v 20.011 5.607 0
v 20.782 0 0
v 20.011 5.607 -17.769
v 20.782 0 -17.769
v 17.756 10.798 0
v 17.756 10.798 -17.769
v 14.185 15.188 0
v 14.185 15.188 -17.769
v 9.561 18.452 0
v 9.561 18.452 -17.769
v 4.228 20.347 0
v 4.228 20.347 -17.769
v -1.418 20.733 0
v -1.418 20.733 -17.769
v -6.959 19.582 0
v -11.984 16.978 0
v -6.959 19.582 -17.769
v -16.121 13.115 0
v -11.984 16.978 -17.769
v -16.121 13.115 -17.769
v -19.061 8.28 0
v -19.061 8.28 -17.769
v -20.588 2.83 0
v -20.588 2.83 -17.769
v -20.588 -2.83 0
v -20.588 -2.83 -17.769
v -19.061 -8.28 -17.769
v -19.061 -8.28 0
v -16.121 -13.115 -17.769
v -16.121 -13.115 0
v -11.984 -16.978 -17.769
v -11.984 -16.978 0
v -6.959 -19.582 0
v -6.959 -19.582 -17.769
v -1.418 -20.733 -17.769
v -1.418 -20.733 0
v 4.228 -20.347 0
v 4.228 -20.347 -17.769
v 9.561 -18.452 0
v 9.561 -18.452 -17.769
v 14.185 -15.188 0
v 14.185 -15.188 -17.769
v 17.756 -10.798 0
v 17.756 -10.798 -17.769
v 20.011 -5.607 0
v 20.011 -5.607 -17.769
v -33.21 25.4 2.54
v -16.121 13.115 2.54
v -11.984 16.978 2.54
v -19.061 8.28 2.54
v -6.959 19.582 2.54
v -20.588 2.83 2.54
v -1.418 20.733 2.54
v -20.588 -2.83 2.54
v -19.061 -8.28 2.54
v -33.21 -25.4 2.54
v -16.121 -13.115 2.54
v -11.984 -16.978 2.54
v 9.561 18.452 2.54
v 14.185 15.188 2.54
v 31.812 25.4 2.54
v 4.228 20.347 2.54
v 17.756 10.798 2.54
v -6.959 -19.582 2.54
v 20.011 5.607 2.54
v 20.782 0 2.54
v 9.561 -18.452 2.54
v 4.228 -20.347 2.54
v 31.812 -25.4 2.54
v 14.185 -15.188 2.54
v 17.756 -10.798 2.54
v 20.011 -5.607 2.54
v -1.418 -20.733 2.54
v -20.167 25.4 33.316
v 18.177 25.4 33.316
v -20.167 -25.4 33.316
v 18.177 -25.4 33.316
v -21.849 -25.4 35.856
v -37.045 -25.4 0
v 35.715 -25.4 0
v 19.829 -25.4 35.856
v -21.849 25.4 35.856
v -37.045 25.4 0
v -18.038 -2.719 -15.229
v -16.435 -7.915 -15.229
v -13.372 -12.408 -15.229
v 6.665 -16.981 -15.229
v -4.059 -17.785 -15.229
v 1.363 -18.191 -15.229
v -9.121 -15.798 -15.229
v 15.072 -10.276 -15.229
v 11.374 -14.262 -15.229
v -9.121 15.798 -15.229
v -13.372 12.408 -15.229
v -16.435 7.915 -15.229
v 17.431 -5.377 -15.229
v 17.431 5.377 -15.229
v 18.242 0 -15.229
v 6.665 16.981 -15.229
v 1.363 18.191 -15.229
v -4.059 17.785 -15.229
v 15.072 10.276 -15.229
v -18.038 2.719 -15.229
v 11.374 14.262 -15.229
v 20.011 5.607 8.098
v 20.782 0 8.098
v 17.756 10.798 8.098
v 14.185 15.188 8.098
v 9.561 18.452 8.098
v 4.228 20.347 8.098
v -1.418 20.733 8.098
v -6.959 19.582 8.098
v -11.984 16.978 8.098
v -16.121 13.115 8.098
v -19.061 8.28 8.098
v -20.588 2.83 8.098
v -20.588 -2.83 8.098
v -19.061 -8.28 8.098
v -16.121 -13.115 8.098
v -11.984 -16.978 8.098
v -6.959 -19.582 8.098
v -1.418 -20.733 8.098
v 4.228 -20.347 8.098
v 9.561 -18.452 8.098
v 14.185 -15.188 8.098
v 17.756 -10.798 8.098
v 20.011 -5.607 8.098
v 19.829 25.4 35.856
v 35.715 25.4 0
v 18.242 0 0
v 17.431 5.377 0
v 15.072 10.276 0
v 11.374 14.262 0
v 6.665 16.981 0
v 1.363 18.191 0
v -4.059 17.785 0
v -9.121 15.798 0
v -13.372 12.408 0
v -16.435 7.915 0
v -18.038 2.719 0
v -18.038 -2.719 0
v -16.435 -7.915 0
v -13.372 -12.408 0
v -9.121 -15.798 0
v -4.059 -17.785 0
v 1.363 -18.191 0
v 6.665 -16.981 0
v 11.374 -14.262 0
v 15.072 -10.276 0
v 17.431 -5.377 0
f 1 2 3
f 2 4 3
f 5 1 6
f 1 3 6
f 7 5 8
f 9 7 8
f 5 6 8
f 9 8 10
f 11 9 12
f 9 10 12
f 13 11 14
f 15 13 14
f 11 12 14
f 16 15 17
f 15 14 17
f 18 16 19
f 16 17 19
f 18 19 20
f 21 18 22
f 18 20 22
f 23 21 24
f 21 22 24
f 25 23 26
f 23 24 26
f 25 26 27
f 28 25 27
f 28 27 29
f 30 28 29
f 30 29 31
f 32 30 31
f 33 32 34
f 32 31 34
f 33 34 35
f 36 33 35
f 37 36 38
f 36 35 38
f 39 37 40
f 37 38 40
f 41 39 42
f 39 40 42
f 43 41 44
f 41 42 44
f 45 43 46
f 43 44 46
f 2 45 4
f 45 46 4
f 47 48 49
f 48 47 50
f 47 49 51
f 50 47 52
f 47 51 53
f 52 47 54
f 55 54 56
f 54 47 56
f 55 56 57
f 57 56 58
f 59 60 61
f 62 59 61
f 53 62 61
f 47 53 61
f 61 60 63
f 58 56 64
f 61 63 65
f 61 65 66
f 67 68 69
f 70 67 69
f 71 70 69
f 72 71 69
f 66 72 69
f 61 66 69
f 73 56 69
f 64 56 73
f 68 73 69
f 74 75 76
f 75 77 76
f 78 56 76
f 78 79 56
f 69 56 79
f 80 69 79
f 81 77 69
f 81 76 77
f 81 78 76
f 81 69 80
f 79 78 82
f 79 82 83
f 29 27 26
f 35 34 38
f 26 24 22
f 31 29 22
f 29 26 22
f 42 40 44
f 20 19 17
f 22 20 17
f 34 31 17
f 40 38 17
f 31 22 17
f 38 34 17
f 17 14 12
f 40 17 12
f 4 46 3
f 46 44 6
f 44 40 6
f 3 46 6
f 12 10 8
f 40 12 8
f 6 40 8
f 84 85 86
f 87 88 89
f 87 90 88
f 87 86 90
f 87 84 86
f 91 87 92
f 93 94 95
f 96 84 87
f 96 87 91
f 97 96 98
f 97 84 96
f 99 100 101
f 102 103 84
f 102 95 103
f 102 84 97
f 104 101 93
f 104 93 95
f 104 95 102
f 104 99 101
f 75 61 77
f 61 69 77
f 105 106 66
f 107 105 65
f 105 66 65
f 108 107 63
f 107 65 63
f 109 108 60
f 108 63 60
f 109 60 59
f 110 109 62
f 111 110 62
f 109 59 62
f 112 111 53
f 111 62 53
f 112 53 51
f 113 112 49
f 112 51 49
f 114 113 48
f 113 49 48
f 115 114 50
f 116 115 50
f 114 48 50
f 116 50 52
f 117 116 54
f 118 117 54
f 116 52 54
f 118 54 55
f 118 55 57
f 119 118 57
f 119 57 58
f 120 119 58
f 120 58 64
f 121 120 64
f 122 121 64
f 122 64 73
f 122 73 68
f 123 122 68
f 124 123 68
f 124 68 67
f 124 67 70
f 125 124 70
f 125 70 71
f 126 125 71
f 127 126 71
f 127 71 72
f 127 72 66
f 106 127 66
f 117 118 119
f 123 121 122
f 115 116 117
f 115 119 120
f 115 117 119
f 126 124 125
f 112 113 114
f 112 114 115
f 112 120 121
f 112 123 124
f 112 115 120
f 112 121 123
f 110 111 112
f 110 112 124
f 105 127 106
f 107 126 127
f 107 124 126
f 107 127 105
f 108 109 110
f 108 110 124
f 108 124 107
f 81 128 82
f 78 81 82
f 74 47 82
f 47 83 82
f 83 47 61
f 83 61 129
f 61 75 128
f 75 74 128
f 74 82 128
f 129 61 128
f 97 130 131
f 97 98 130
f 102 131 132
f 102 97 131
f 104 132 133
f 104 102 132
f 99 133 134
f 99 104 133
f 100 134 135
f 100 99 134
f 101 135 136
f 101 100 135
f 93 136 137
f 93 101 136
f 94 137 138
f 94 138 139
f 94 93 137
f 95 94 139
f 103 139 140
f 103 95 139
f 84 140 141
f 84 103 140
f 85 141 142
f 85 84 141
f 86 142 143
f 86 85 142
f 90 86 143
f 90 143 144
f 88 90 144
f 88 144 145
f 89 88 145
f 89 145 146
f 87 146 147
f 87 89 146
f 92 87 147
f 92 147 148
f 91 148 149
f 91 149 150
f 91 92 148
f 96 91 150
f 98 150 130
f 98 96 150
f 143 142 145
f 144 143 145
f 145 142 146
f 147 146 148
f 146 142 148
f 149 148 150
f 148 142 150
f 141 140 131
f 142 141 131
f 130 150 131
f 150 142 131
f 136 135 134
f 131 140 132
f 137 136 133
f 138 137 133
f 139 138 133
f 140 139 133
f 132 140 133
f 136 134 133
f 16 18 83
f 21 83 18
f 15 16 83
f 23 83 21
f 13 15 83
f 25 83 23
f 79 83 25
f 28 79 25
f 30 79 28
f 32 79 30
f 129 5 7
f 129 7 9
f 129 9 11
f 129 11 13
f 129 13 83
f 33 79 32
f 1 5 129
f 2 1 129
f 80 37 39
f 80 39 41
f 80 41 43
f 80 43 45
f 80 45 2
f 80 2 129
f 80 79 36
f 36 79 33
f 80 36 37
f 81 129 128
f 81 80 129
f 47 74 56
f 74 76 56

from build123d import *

# Parameters (mm, degrees)
F1_DEPTH = 25.4
F2_R     = 20.781866
F3_DEPTH = 17.769353
F4_DEPTH = 11.559019
F5_DEPTH = 25.4
F6_T     = -2.54
F7_DEPTH = 8.098027


with BuildPart() as f1:
    # F0 (on Front) → F1 (new body)
    with BuildSketch(Plane.XZ):
        Polygon((35.715379, 0), (19.829497, 35.855889), (-21.848936, 35.855889), (-37.045002, 0), (0, 0), align=None)
    extrude(amount=F1_DEPTH)

    # F2 (on Top) → F3 (join)
    with BuildSketch(Plane.XY):
        Circle(F2_R)
    extrude(amount=-F3_DEPTH)

    # F3_face (on face) → F4 (join)
    with BuildSketch(Plane(origin=(0, 8.820098, 0), x_dir=(1, 0, 0), z_dir=(0, 0, 1))):
        with BuildLine():
            Line((-20.781866, -8.820098), (20.781866, -8.820098))
            ThreePointArc((20.781866, -8.820098), (0, 11.961768), (-20.781866, -8.820098))
        make_face()
    extrude(amount=F4_DEPTH)

    # F0 (on Front) → F5 (join)
    with BuildSketch(Plane.XZ):
        Polygon((35.715379, 0), (19.829497, 35.855889), (-21.848936, 35.855889), (-37.045002, 0), (0, 0), align=None)
    extrude(amount=-F5_DEPTH)

    # F6
    f6_openings = [f1.faces().sort_by_distance(p)[0] for p in [
        (-0.821653, -25.4, 16.304849),
        (-0.821653, 25.4, 16.304849),
    ]]
    offset(amount=F6_T, openings=f6_openings)

    # F2 (on Top) → F7 (join)
    with BuildSketch(Plane.XY):
        Circle(F2_R)
    extrude(amount=F7_DEPTH)


solid = f1.part
